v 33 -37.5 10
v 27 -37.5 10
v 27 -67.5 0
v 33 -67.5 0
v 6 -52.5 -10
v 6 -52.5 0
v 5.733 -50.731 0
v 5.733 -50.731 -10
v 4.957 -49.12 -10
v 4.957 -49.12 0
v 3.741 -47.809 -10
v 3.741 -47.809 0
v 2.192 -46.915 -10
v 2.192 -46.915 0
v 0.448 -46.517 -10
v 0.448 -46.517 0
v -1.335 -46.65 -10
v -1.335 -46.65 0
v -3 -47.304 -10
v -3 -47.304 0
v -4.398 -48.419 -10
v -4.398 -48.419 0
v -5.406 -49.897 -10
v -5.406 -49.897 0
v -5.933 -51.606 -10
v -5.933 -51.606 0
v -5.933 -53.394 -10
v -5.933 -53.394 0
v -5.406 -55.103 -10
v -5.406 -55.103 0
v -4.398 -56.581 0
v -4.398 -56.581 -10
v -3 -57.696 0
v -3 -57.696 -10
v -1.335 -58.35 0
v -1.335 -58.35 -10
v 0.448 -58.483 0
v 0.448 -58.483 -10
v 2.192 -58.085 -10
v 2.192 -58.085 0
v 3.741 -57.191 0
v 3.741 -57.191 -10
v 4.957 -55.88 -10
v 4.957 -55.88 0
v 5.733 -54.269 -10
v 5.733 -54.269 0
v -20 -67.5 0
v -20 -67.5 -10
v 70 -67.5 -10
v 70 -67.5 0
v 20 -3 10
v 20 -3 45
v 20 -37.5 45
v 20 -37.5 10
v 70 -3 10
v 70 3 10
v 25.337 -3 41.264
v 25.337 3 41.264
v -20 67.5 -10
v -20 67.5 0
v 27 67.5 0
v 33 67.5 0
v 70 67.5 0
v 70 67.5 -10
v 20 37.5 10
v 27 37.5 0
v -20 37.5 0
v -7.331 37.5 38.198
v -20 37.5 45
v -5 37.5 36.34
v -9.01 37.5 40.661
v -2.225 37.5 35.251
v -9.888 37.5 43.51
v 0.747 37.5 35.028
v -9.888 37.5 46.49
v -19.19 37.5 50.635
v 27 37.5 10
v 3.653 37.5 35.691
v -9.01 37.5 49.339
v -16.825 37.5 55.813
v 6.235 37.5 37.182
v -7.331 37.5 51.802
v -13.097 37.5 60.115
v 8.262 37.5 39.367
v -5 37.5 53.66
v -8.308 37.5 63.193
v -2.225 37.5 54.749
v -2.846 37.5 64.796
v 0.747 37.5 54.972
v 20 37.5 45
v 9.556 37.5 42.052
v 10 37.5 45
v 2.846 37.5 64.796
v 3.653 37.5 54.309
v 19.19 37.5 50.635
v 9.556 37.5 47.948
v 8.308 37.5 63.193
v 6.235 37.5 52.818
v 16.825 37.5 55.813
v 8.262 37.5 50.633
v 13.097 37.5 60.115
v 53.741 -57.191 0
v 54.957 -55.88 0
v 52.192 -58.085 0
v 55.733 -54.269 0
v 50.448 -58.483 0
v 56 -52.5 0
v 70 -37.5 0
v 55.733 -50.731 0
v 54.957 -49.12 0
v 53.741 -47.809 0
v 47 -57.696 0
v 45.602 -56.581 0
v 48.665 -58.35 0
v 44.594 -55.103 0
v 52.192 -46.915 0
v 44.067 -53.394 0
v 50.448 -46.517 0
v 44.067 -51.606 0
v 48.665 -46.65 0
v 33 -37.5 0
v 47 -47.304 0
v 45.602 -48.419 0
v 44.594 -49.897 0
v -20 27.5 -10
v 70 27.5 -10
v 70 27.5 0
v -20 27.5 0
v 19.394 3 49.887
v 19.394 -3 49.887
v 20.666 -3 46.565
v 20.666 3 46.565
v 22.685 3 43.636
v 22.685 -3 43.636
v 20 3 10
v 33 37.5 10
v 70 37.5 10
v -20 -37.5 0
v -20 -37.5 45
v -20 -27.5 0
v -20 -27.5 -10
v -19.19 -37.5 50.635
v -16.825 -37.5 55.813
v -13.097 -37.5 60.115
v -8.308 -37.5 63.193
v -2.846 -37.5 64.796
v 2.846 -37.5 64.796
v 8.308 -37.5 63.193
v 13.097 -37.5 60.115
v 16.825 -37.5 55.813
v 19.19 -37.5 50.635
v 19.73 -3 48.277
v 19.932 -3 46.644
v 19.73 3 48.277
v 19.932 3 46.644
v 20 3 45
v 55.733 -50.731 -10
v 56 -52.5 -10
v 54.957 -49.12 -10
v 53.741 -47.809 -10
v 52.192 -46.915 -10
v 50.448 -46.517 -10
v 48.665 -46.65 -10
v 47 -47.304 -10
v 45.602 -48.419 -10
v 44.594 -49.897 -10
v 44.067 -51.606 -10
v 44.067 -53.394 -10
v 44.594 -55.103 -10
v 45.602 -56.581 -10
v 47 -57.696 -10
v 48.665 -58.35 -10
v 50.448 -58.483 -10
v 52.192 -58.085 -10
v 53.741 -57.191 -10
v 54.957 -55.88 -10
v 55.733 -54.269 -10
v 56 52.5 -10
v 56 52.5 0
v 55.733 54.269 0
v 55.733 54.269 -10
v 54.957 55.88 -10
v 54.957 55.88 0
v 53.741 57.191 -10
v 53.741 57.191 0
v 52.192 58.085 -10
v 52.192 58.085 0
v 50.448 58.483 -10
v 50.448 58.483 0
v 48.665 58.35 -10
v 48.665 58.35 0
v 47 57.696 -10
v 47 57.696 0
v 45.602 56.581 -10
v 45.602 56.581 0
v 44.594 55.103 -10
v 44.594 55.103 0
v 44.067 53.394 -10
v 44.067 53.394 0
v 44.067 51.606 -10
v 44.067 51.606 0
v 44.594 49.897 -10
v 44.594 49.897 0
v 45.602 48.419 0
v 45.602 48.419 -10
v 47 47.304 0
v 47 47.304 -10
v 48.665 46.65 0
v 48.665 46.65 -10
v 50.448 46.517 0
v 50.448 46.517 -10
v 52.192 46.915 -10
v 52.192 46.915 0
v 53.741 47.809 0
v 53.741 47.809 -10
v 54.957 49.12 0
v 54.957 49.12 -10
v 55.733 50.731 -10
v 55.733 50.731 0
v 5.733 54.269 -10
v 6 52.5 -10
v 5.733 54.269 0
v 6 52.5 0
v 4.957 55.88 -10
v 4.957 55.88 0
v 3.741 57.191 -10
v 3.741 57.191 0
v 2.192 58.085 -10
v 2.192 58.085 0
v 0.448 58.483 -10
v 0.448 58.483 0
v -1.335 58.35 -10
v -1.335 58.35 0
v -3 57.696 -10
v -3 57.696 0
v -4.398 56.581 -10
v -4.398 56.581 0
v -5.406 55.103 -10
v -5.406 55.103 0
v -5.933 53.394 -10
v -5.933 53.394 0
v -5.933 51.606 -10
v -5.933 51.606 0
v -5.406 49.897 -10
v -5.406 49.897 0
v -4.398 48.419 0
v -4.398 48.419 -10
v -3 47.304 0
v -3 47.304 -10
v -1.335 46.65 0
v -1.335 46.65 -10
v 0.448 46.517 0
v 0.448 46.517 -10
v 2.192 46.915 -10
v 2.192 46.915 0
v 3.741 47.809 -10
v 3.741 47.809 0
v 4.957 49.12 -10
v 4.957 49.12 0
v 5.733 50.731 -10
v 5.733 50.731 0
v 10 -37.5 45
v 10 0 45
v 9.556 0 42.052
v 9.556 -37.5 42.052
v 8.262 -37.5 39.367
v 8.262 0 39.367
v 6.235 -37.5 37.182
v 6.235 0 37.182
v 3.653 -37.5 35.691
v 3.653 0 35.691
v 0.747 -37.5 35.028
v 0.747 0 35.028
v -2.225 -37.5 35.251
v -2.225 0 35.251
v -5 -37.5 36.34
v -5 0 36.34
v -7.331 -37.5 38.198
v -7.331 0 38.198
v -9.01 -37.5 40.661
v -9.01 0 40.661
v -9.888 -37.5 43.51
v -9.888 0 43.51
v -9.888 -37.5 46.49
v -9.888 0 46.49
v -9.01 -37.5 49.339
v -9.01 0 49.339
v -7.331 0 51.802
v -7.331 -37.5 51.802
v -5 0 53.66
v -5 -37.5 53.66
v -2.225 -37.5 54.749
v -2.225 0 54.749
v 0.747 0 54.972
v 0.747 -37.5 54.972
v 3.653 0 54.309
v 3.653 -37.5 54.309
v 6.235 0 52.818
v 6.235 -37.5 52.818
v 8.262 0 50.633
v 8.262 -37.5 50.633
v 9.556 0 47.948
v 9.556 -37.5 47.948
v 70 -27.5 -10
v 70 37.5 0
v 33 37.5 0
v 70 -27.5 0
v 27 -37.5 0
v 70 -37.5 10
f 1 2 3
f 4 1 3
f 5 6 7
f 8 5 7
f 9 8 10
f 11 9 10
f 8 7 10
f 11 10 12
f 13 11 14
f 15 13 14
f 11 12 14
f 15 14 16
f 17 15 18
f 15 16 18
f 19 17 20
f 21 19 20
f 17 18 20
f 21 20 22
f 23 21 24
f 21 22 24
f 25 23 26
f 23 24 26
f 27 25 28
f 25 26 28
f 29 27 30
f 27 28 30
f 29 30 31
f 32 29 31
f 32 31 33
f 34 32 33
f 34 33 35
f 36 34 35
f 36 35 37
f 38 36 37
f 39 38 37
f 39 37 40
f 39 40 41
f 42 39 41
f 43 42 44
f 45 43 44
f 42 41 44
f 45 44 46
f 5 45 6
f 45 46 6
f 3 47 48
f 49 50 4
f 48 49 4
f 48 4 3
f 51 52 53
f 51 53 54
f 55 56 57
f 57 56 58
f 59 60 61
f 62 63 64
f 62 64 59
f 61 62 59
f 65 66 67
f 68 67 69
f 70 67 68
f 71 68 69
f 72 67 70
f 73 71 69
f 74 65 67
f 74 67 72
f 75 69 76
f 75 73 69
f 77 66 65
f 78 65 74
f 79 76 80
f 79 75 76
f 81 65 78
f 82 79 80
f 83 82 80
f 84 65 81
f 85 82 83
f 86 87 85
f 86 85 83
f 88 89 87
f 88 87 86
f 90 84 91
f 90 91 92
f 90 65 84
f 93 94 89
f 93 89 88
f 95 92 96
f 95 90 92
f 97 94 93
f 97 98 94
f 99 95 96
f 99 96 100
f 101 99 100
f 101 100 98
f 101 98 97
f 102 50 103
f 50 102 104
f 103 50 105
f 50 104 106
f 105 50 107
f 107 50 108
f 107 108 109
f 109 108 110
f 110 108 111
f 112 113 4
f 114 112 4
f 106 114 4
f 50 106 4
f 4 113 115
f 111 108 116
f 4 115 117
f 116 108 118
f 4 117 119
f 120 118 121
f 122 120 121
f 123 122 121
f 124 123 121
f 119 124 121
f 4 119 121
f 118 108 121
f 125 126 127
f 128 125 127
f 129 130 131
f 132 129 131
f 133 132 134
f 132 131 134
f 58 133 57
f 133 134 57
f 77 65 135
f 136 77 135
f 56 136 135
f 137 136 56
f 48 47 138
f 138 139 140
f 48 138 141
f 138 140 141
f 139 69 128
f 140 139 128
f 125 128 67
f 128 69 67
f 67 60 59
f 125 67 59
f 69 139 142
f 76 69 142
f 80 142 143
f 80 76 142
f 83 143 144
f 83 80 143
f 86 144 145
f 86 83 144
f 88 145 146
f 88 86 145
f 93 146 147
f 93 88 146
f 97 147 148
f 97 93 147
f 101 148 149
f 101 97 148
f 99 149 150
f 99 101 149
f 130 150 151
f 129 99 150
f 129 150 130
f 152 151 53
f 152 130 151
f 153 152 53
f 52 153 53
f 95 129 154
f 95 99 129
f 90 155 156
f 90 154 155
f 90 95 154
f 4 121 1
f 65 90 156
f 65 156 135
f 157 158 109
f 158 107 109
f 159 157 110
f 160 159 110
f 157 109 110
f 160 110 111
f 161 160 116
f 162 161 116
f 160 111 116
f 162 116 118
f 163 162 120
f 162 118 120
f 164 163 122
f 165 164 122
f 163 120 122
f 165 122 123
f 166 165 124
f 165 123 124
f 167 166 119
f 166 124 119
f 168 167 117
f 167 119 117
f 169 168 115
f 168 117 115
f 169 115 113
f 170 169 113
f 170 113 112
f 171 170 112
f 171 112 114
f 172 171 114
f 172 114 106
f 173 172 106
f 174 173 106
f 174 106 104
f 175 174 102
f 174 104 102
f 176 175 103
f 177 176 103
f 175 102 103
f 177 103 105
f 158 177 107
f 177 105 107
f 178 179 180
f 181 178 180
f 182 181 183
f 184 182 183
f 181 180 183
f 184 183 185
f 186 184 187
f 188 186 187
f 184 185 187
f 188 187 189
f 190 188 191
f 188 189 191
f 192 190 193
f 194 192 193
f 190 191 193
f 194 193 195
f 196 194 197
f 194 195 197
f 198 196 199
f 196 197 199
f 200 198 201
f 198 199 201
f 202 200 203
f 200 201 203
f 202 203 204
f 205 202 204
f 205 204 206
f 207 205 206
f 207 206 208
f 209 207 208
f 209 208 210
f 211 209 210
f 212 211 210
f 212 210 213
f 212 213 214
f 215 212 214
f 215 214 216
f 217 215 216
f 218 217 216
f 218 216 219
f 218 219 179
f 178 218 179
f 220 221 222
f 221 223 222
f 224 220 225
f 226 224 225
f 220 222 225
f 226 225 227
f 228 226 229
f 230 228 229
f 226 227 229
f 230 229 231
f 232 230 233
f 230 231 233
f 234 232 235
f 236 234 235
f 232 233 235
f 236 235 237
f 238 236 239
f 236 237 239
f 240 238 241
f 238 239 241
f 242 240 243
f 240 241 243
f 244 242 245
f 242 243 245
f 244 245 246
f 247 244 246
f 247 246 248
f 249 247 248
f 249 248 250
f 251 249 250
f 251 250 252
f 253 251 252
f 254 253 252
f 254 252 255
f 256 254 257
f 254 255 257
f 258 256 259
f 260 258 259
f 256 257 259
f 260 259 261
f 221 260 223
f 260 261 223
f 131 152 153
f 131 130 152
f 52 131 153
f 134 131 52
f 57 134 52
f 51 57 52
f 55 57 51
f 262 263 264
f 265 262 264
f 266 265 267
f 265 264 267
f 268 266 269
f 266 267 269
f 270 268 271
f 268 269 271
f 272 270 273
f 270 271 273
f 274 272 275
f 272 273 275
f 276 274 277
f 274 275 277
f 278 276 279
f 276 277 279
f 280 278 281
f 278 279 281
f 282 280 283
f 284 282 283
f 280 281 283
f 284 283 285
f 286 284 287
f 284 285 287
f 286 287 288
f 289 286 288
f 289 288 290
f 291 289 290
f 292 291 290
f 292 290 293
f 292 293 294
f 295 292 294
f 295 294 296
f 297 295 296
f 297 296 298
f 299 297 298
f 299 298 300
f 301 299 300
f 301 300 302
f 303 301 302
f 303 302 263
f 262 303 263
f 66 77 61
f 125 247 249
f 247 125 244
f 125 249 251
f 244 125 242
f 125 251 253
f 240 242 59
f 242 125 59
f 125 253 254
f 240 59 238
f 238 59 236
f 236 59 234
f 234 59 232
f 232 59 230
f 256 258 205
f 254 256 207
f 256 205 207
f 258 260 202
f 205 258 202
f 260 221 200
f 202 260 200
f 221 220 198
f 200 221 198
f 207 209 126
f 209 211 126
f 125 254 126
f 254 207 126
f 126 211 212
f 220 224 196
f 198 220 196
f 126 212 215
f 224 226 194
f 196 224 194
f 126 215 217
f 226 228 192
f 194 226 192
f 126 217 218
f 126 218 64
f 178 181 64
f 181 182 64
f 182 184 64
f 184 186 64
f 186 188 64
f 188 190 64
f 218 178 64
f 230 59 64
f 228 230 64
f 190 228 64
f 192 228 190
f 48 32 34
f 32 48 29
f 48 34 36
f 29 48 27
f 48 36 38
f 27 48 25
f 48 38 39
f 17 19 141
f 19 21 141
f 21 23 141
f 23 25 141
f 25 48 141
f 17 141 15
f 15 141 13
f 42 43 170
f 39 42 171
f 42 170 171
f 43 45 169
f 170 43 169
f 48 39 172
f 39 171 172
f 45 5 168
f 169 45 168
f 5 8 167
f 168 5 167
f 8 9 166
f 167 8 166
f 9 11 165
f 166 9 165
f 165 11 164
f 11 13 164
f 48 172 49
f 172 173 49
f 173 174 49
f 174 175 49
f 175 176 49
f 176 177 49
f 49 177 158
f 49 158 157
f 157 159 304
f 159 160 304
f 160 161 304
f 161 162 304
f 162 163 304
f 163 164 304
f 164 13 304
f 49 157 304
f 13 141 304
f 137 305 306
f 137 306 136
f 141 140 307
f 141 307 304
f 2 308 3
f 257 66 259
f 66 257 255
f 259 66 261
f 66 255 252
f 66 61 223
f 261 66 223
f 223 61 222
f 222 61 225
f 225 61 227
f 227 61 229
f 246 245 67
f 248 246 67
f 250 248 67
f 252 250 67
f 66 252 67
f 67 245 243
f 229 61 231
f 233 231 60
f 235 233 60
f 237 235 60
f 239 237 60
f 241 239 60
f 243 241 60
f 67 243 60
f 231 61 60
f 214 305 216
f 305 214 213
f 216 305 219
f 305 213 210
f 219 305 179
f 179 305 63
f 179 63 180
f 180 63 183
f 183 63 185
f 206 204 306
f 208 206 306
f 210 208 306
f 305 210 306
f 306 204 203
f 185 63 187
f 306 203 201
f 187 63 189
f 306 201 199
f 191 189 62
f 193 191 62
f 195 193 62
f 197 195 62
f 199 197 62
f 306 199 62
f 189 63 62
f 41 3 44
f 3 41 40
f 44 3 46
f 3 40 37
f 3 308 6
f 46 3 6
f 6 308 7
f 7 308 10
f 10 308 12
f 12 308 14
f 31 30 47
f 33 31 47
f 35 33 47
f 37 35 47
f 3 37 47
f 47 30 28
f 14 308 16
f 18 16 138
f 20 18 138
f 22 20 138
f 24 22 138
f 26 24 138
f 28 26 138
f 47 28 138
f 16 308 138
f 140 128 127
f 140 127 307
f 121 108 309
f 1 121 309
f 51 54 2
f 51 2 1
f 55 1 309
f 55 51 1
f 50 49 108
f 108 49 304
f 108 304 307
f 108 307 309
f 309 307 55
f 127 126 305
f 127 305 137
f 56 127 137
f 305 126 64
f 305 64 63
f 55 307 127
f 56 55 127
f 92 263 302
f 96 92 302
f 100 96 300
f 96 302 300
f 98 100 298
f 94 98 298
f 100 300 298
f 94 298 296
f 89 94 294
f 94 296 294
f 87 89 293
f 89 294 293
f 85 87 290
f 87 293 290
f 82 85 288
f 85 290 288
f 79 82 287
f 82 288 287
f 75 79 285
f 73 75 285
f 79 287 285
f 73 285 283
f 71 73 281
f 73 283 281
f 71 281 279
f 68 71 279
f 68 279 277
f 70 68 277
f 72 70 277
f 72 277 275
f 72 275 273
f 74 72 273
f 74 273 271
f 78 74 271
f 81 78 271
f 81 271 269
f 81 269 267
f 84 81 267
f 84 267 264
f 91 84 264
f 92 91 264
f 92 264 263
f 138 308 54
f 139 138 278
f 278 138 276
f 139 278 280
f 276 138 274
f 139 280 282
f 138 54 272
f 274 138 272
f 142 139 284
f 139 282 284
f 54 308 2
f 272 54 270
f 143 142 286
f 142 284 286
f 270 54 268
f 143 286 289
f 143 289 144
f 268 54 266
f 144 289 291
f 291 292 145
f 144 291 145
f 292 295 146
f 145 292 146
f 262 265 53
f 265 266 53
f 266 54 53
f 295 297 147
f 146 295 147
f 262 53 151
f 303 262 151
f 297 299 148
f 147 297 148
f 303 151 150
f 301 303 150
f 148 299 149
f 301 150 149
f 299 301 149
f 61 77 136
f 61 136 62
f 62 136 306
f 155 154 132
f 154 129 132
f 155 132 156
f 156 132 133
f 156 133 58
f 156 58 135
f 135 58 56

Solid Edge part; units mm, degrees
sketch "Sketch1" plane through (0, 0, 0) normal (0, -1, 0) x (1, 0, 0)
  line L0 (70, 0) -> (-20, 0)
  line L1 (-20, 0) -> (-20, -10)
  line L2 (-20, -10) -> (70, -10)
  line L3 (70, -10) -> (70, 0)
extrude "Protrusion1" add sketch "Sketch1" along normal mid plane 135
sketch "Sketch2" plane through (0, 0, 0) normal (0, -1, 0) x (1, 0, 0)
  line L0 (70, 10) -> (70, 0)
  line L1 (70, 0) -> (-20, 0)
  line L2 (-20, 0) -> (-20, 45)
  line L3 (20, 45) -> (20, 10)
  line L4 (20, 10) -> (70, 10)
  arc A0 (-20, 45) -> (20, 45) centre (0, 45) cw
extrude "ExtrudedProtrusion_2" add sketch "Sketch2" along normal mid plane 75
sketch "Sketch3" plane through (0, 0, 0) normal (0, -1, 0) x (1, 0, 0)
  circle A0 centre (0, 45) radius 10
extrude "ExtrudedCutout_1" cut sketch "Sketch3" along normal mid plane 308.4741
sketch "Sketch4" plane through (70, 0, 0) normal (1, 0, 0) x (0, 1, 0)
  line L0 (-27.5, 0) -> (-27.5, -10)
  line L1 (-27.5, -10) -> (27.5, -10)
  line L2 (27.5, -10) -> (27.5, 0)
  line L3 (27.5, 0) -> (-27.5, 0)
extrude "ExtrudedCutout_2" cut sketch "Sketch4" along normal mid plane 314.3461
sketch "Sketch5" plane through (0, 0, 0) normal (0, -1, 0) x (1, 0, 0)
  line L0 (70, 10) -> (20, 45)
  line L1 (20, 45) -> (20, 10)
  line L2 (20, 10) -> (70, 10)
extrude "ExtrudedProtrusion_3" add sketch "Sketch5" along normal mid plane 6
sketch "Sketch6" plane through (25, -52.5, 0) normal (0, 0, 1) x (1, 0, 0)
  circle A0 centre (-25, 0) radius 6
  circle A1 centre (25, 0) radius 6
  circle A2 centre (-25, 105) radius 6
  circle A3 centre (25, 105) radius 6
extrude "ExtrudedCutout_3" cut sketch "Sketch6" along normal mid plane 143.6428
fillet "Round_1" radius 15 1 edges at (20, 0, 45)
sketch "Sketch7" plane through (30, 0, 0) normal (1, 0, 0) x (0, 1, 0)
  line L0 (-37.5, 0) -> (-37.5, 10)
  line L1 (-37.5, 10) -> (-67.5, 0)
  line L2 (-67.5, 0) -> (-37.5, 0)
  line L3 (37.5, 0) -> (37.5, 10)
  line L4 (37.5, 10) -> (67.5, 0)
  line L5 (67.5, 0) -> (37.5, 0)
extrude "Protrusion_4" add sketch "Sketch7" along normal mid plane 6
